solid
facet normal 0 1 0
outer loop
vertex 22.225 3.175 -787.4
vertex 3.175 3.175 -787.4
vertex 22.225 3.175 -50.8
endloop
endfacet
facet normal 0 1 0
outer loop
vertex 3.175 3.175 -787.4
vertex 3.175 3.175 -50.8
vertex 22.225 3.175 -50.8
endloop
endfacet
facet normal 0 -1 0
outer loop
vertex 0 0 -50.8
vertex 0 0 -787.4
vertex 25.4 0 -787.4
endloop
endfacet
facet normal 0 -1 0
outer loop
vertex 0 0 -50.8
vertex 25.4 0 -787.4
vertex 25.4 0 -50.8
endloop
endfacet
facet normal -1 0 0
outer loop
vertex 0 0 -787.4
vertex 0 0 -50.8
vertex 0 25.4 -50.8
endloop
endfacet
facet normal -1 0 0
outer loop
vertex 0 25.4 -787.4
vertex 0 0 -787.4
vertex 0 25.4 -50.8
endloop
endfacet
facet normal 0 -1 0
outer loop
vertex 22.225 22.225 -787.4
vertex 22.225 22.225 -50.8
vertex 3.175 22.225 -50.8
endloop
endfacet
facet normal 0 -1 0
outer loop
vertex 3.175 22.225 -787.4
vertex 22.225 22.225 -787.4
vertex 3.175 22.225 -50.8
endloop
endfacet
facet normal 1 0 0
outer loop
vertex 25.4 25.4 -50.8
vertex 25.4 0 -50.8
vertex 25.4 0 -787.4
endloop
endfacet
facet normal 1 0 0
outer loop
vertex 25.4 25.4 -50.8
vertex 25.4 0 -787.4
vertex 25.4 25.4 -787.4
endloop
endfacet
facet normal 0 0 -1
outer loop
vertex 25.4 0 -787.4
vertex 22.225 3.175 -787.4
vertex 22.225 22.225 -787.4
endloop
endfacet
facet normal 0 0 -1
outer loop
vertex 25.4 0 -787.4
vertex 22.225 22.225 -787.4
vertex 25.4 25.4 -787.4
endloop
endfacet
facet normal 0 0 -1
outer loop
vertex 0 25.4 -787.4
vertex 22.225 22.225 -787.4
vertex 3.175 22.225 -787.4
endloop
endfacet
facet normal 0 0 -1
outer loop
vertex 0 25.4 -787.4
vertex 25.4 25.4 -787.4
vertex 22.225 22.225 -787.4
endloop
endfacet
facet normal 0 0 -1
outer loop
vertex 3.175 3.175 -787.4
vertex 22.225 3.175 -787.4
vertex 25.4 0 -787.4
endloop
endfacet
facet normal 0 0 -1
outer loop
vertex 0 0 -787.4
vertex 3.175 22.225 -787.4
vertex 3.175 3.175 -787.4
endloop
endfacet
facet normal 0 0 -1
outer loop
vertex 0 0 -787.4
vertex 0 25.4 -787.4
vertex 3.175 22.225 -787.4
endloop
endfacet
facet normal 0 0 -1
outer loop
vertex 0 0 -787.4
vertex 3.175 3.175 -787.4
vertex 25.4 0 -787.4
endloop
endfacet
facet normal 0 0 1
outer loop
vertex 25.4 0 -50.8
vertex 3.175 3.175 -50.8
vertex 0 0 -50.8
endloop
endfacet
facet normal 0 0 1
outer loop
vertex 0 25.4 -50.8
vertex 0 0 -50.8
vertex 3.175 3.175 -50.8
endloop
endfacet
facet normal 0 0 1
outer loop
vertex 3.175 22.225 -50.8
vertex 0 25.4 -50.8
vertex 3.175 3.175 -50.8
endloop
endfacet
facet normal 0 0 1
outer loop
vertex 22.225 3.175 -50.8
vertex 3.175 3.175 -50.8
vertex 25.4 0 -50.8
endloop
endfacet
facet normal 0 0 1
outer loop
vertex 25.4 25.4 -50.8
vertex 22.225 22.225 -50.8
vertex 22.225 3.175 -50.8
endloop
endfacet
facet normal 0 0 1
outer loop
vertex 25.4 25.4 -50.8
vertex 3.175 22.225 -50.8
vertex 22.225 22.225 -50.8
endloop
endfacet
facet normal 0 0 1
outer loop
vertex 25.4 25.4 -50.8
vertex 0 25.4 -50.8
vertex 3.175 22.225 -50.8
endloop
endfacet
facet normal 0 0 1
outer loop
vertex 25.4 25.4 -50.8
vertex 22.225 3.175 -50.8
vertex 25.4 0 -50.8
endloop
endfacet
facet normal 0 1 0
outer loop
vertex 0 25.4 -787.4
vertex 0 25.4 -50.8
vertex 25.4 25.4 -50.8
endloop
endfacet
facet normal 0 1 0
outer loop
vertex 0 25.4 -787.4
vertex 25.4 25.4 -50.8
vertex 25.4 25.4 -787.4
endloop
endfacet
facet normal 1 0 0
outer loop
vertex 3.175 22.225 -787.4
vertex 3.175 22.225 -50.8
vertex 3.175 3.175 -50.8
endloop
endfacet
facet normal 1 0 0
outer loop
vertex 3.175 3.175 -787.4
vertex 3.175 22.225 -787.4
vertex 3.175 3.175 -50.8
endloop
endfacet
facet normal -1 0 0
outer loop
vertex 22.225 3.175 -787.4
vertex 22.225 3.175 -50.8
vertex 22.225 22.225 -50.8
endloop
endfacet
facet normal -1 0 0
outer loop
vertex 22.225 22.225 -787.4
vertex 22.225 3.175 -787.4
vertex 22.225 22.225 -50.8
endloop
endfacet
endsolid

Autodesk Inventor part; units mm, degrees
ref_plane "YZ Plane" through (0, 0, 0) normal (1, 0, 0) x (0, 1, 0)
ref_plane "XZ Plane" through (0, 0, 0) normal (0, 1, 0) x (-1, 0, 0)
ref_plane "XY Plane" through (0, 0, 0) normal (0, 0, 1) x (1, 0, 0)
sketch "Sketch1" plane through (0, 0, 0) normal (1, 0, 0) x (0, 1, 0)
  line L0 (0, 0) -> (25.4, 0)
  line L1 (25.4, 0) -> (25.4, -787.4)
  line L2 (25.4, -787.4) -> (0, -787.4)
  line L3 (0, -787.4) -> (0, 0)
  dimension "d0" = 787.4
  dimension "d1" = 25.4
extrude "Extrusion1" add sketch "Sketch1" along normal blind 25.4
sketch "Sketch2" plane through (0, 0, 0) normal (0, 0, 1) x (1, 0, 0)
  line L0 (3.175, 3.175) -> (22.225, 3.175)
  line L1 (22.225, 3.175) -> (22.225, 22.225)
  line L2 (22.225, 22.225) -> (3.175, 22.225)
  line L3 (3.175, 22.225) -> (3.175, 3.175)
  line L4 (0, 25.4) -> (25.4, 25.4) projected
  line L5 (0, 0) -> (0, 25.4) projected
  dimension "d4" = 3.175
  dimension "d5" = 3.175
  dimension "d6" = 19.05
  dimension "d7" = 19.05
extrude "Extrusion2" cut sketch "Sketch2" against normal blind 787.4
sketch "Sketch3" plane through (0, 0, 0) normal (0, 0, 1) x (1, 0, 0)
  line L0 (-24.3318, 33.3766) -> (65.9681, 33.3766)
  line L1 (65.9681, 33.3766) -> (65.9681, -31.7467)
  line L2 (65.9681, -31.7467) -> (-24.3318, -31.7467)
  line L3 (-24.3318, -31.7467) -> (-24.3318, 33.3766)
  point P0 (0, 0)
extrude "Extrusion3" cut sketch "Sketch3" against normal blind 50.8
properties part number "1by1by31" material "Aluminum 6061"
